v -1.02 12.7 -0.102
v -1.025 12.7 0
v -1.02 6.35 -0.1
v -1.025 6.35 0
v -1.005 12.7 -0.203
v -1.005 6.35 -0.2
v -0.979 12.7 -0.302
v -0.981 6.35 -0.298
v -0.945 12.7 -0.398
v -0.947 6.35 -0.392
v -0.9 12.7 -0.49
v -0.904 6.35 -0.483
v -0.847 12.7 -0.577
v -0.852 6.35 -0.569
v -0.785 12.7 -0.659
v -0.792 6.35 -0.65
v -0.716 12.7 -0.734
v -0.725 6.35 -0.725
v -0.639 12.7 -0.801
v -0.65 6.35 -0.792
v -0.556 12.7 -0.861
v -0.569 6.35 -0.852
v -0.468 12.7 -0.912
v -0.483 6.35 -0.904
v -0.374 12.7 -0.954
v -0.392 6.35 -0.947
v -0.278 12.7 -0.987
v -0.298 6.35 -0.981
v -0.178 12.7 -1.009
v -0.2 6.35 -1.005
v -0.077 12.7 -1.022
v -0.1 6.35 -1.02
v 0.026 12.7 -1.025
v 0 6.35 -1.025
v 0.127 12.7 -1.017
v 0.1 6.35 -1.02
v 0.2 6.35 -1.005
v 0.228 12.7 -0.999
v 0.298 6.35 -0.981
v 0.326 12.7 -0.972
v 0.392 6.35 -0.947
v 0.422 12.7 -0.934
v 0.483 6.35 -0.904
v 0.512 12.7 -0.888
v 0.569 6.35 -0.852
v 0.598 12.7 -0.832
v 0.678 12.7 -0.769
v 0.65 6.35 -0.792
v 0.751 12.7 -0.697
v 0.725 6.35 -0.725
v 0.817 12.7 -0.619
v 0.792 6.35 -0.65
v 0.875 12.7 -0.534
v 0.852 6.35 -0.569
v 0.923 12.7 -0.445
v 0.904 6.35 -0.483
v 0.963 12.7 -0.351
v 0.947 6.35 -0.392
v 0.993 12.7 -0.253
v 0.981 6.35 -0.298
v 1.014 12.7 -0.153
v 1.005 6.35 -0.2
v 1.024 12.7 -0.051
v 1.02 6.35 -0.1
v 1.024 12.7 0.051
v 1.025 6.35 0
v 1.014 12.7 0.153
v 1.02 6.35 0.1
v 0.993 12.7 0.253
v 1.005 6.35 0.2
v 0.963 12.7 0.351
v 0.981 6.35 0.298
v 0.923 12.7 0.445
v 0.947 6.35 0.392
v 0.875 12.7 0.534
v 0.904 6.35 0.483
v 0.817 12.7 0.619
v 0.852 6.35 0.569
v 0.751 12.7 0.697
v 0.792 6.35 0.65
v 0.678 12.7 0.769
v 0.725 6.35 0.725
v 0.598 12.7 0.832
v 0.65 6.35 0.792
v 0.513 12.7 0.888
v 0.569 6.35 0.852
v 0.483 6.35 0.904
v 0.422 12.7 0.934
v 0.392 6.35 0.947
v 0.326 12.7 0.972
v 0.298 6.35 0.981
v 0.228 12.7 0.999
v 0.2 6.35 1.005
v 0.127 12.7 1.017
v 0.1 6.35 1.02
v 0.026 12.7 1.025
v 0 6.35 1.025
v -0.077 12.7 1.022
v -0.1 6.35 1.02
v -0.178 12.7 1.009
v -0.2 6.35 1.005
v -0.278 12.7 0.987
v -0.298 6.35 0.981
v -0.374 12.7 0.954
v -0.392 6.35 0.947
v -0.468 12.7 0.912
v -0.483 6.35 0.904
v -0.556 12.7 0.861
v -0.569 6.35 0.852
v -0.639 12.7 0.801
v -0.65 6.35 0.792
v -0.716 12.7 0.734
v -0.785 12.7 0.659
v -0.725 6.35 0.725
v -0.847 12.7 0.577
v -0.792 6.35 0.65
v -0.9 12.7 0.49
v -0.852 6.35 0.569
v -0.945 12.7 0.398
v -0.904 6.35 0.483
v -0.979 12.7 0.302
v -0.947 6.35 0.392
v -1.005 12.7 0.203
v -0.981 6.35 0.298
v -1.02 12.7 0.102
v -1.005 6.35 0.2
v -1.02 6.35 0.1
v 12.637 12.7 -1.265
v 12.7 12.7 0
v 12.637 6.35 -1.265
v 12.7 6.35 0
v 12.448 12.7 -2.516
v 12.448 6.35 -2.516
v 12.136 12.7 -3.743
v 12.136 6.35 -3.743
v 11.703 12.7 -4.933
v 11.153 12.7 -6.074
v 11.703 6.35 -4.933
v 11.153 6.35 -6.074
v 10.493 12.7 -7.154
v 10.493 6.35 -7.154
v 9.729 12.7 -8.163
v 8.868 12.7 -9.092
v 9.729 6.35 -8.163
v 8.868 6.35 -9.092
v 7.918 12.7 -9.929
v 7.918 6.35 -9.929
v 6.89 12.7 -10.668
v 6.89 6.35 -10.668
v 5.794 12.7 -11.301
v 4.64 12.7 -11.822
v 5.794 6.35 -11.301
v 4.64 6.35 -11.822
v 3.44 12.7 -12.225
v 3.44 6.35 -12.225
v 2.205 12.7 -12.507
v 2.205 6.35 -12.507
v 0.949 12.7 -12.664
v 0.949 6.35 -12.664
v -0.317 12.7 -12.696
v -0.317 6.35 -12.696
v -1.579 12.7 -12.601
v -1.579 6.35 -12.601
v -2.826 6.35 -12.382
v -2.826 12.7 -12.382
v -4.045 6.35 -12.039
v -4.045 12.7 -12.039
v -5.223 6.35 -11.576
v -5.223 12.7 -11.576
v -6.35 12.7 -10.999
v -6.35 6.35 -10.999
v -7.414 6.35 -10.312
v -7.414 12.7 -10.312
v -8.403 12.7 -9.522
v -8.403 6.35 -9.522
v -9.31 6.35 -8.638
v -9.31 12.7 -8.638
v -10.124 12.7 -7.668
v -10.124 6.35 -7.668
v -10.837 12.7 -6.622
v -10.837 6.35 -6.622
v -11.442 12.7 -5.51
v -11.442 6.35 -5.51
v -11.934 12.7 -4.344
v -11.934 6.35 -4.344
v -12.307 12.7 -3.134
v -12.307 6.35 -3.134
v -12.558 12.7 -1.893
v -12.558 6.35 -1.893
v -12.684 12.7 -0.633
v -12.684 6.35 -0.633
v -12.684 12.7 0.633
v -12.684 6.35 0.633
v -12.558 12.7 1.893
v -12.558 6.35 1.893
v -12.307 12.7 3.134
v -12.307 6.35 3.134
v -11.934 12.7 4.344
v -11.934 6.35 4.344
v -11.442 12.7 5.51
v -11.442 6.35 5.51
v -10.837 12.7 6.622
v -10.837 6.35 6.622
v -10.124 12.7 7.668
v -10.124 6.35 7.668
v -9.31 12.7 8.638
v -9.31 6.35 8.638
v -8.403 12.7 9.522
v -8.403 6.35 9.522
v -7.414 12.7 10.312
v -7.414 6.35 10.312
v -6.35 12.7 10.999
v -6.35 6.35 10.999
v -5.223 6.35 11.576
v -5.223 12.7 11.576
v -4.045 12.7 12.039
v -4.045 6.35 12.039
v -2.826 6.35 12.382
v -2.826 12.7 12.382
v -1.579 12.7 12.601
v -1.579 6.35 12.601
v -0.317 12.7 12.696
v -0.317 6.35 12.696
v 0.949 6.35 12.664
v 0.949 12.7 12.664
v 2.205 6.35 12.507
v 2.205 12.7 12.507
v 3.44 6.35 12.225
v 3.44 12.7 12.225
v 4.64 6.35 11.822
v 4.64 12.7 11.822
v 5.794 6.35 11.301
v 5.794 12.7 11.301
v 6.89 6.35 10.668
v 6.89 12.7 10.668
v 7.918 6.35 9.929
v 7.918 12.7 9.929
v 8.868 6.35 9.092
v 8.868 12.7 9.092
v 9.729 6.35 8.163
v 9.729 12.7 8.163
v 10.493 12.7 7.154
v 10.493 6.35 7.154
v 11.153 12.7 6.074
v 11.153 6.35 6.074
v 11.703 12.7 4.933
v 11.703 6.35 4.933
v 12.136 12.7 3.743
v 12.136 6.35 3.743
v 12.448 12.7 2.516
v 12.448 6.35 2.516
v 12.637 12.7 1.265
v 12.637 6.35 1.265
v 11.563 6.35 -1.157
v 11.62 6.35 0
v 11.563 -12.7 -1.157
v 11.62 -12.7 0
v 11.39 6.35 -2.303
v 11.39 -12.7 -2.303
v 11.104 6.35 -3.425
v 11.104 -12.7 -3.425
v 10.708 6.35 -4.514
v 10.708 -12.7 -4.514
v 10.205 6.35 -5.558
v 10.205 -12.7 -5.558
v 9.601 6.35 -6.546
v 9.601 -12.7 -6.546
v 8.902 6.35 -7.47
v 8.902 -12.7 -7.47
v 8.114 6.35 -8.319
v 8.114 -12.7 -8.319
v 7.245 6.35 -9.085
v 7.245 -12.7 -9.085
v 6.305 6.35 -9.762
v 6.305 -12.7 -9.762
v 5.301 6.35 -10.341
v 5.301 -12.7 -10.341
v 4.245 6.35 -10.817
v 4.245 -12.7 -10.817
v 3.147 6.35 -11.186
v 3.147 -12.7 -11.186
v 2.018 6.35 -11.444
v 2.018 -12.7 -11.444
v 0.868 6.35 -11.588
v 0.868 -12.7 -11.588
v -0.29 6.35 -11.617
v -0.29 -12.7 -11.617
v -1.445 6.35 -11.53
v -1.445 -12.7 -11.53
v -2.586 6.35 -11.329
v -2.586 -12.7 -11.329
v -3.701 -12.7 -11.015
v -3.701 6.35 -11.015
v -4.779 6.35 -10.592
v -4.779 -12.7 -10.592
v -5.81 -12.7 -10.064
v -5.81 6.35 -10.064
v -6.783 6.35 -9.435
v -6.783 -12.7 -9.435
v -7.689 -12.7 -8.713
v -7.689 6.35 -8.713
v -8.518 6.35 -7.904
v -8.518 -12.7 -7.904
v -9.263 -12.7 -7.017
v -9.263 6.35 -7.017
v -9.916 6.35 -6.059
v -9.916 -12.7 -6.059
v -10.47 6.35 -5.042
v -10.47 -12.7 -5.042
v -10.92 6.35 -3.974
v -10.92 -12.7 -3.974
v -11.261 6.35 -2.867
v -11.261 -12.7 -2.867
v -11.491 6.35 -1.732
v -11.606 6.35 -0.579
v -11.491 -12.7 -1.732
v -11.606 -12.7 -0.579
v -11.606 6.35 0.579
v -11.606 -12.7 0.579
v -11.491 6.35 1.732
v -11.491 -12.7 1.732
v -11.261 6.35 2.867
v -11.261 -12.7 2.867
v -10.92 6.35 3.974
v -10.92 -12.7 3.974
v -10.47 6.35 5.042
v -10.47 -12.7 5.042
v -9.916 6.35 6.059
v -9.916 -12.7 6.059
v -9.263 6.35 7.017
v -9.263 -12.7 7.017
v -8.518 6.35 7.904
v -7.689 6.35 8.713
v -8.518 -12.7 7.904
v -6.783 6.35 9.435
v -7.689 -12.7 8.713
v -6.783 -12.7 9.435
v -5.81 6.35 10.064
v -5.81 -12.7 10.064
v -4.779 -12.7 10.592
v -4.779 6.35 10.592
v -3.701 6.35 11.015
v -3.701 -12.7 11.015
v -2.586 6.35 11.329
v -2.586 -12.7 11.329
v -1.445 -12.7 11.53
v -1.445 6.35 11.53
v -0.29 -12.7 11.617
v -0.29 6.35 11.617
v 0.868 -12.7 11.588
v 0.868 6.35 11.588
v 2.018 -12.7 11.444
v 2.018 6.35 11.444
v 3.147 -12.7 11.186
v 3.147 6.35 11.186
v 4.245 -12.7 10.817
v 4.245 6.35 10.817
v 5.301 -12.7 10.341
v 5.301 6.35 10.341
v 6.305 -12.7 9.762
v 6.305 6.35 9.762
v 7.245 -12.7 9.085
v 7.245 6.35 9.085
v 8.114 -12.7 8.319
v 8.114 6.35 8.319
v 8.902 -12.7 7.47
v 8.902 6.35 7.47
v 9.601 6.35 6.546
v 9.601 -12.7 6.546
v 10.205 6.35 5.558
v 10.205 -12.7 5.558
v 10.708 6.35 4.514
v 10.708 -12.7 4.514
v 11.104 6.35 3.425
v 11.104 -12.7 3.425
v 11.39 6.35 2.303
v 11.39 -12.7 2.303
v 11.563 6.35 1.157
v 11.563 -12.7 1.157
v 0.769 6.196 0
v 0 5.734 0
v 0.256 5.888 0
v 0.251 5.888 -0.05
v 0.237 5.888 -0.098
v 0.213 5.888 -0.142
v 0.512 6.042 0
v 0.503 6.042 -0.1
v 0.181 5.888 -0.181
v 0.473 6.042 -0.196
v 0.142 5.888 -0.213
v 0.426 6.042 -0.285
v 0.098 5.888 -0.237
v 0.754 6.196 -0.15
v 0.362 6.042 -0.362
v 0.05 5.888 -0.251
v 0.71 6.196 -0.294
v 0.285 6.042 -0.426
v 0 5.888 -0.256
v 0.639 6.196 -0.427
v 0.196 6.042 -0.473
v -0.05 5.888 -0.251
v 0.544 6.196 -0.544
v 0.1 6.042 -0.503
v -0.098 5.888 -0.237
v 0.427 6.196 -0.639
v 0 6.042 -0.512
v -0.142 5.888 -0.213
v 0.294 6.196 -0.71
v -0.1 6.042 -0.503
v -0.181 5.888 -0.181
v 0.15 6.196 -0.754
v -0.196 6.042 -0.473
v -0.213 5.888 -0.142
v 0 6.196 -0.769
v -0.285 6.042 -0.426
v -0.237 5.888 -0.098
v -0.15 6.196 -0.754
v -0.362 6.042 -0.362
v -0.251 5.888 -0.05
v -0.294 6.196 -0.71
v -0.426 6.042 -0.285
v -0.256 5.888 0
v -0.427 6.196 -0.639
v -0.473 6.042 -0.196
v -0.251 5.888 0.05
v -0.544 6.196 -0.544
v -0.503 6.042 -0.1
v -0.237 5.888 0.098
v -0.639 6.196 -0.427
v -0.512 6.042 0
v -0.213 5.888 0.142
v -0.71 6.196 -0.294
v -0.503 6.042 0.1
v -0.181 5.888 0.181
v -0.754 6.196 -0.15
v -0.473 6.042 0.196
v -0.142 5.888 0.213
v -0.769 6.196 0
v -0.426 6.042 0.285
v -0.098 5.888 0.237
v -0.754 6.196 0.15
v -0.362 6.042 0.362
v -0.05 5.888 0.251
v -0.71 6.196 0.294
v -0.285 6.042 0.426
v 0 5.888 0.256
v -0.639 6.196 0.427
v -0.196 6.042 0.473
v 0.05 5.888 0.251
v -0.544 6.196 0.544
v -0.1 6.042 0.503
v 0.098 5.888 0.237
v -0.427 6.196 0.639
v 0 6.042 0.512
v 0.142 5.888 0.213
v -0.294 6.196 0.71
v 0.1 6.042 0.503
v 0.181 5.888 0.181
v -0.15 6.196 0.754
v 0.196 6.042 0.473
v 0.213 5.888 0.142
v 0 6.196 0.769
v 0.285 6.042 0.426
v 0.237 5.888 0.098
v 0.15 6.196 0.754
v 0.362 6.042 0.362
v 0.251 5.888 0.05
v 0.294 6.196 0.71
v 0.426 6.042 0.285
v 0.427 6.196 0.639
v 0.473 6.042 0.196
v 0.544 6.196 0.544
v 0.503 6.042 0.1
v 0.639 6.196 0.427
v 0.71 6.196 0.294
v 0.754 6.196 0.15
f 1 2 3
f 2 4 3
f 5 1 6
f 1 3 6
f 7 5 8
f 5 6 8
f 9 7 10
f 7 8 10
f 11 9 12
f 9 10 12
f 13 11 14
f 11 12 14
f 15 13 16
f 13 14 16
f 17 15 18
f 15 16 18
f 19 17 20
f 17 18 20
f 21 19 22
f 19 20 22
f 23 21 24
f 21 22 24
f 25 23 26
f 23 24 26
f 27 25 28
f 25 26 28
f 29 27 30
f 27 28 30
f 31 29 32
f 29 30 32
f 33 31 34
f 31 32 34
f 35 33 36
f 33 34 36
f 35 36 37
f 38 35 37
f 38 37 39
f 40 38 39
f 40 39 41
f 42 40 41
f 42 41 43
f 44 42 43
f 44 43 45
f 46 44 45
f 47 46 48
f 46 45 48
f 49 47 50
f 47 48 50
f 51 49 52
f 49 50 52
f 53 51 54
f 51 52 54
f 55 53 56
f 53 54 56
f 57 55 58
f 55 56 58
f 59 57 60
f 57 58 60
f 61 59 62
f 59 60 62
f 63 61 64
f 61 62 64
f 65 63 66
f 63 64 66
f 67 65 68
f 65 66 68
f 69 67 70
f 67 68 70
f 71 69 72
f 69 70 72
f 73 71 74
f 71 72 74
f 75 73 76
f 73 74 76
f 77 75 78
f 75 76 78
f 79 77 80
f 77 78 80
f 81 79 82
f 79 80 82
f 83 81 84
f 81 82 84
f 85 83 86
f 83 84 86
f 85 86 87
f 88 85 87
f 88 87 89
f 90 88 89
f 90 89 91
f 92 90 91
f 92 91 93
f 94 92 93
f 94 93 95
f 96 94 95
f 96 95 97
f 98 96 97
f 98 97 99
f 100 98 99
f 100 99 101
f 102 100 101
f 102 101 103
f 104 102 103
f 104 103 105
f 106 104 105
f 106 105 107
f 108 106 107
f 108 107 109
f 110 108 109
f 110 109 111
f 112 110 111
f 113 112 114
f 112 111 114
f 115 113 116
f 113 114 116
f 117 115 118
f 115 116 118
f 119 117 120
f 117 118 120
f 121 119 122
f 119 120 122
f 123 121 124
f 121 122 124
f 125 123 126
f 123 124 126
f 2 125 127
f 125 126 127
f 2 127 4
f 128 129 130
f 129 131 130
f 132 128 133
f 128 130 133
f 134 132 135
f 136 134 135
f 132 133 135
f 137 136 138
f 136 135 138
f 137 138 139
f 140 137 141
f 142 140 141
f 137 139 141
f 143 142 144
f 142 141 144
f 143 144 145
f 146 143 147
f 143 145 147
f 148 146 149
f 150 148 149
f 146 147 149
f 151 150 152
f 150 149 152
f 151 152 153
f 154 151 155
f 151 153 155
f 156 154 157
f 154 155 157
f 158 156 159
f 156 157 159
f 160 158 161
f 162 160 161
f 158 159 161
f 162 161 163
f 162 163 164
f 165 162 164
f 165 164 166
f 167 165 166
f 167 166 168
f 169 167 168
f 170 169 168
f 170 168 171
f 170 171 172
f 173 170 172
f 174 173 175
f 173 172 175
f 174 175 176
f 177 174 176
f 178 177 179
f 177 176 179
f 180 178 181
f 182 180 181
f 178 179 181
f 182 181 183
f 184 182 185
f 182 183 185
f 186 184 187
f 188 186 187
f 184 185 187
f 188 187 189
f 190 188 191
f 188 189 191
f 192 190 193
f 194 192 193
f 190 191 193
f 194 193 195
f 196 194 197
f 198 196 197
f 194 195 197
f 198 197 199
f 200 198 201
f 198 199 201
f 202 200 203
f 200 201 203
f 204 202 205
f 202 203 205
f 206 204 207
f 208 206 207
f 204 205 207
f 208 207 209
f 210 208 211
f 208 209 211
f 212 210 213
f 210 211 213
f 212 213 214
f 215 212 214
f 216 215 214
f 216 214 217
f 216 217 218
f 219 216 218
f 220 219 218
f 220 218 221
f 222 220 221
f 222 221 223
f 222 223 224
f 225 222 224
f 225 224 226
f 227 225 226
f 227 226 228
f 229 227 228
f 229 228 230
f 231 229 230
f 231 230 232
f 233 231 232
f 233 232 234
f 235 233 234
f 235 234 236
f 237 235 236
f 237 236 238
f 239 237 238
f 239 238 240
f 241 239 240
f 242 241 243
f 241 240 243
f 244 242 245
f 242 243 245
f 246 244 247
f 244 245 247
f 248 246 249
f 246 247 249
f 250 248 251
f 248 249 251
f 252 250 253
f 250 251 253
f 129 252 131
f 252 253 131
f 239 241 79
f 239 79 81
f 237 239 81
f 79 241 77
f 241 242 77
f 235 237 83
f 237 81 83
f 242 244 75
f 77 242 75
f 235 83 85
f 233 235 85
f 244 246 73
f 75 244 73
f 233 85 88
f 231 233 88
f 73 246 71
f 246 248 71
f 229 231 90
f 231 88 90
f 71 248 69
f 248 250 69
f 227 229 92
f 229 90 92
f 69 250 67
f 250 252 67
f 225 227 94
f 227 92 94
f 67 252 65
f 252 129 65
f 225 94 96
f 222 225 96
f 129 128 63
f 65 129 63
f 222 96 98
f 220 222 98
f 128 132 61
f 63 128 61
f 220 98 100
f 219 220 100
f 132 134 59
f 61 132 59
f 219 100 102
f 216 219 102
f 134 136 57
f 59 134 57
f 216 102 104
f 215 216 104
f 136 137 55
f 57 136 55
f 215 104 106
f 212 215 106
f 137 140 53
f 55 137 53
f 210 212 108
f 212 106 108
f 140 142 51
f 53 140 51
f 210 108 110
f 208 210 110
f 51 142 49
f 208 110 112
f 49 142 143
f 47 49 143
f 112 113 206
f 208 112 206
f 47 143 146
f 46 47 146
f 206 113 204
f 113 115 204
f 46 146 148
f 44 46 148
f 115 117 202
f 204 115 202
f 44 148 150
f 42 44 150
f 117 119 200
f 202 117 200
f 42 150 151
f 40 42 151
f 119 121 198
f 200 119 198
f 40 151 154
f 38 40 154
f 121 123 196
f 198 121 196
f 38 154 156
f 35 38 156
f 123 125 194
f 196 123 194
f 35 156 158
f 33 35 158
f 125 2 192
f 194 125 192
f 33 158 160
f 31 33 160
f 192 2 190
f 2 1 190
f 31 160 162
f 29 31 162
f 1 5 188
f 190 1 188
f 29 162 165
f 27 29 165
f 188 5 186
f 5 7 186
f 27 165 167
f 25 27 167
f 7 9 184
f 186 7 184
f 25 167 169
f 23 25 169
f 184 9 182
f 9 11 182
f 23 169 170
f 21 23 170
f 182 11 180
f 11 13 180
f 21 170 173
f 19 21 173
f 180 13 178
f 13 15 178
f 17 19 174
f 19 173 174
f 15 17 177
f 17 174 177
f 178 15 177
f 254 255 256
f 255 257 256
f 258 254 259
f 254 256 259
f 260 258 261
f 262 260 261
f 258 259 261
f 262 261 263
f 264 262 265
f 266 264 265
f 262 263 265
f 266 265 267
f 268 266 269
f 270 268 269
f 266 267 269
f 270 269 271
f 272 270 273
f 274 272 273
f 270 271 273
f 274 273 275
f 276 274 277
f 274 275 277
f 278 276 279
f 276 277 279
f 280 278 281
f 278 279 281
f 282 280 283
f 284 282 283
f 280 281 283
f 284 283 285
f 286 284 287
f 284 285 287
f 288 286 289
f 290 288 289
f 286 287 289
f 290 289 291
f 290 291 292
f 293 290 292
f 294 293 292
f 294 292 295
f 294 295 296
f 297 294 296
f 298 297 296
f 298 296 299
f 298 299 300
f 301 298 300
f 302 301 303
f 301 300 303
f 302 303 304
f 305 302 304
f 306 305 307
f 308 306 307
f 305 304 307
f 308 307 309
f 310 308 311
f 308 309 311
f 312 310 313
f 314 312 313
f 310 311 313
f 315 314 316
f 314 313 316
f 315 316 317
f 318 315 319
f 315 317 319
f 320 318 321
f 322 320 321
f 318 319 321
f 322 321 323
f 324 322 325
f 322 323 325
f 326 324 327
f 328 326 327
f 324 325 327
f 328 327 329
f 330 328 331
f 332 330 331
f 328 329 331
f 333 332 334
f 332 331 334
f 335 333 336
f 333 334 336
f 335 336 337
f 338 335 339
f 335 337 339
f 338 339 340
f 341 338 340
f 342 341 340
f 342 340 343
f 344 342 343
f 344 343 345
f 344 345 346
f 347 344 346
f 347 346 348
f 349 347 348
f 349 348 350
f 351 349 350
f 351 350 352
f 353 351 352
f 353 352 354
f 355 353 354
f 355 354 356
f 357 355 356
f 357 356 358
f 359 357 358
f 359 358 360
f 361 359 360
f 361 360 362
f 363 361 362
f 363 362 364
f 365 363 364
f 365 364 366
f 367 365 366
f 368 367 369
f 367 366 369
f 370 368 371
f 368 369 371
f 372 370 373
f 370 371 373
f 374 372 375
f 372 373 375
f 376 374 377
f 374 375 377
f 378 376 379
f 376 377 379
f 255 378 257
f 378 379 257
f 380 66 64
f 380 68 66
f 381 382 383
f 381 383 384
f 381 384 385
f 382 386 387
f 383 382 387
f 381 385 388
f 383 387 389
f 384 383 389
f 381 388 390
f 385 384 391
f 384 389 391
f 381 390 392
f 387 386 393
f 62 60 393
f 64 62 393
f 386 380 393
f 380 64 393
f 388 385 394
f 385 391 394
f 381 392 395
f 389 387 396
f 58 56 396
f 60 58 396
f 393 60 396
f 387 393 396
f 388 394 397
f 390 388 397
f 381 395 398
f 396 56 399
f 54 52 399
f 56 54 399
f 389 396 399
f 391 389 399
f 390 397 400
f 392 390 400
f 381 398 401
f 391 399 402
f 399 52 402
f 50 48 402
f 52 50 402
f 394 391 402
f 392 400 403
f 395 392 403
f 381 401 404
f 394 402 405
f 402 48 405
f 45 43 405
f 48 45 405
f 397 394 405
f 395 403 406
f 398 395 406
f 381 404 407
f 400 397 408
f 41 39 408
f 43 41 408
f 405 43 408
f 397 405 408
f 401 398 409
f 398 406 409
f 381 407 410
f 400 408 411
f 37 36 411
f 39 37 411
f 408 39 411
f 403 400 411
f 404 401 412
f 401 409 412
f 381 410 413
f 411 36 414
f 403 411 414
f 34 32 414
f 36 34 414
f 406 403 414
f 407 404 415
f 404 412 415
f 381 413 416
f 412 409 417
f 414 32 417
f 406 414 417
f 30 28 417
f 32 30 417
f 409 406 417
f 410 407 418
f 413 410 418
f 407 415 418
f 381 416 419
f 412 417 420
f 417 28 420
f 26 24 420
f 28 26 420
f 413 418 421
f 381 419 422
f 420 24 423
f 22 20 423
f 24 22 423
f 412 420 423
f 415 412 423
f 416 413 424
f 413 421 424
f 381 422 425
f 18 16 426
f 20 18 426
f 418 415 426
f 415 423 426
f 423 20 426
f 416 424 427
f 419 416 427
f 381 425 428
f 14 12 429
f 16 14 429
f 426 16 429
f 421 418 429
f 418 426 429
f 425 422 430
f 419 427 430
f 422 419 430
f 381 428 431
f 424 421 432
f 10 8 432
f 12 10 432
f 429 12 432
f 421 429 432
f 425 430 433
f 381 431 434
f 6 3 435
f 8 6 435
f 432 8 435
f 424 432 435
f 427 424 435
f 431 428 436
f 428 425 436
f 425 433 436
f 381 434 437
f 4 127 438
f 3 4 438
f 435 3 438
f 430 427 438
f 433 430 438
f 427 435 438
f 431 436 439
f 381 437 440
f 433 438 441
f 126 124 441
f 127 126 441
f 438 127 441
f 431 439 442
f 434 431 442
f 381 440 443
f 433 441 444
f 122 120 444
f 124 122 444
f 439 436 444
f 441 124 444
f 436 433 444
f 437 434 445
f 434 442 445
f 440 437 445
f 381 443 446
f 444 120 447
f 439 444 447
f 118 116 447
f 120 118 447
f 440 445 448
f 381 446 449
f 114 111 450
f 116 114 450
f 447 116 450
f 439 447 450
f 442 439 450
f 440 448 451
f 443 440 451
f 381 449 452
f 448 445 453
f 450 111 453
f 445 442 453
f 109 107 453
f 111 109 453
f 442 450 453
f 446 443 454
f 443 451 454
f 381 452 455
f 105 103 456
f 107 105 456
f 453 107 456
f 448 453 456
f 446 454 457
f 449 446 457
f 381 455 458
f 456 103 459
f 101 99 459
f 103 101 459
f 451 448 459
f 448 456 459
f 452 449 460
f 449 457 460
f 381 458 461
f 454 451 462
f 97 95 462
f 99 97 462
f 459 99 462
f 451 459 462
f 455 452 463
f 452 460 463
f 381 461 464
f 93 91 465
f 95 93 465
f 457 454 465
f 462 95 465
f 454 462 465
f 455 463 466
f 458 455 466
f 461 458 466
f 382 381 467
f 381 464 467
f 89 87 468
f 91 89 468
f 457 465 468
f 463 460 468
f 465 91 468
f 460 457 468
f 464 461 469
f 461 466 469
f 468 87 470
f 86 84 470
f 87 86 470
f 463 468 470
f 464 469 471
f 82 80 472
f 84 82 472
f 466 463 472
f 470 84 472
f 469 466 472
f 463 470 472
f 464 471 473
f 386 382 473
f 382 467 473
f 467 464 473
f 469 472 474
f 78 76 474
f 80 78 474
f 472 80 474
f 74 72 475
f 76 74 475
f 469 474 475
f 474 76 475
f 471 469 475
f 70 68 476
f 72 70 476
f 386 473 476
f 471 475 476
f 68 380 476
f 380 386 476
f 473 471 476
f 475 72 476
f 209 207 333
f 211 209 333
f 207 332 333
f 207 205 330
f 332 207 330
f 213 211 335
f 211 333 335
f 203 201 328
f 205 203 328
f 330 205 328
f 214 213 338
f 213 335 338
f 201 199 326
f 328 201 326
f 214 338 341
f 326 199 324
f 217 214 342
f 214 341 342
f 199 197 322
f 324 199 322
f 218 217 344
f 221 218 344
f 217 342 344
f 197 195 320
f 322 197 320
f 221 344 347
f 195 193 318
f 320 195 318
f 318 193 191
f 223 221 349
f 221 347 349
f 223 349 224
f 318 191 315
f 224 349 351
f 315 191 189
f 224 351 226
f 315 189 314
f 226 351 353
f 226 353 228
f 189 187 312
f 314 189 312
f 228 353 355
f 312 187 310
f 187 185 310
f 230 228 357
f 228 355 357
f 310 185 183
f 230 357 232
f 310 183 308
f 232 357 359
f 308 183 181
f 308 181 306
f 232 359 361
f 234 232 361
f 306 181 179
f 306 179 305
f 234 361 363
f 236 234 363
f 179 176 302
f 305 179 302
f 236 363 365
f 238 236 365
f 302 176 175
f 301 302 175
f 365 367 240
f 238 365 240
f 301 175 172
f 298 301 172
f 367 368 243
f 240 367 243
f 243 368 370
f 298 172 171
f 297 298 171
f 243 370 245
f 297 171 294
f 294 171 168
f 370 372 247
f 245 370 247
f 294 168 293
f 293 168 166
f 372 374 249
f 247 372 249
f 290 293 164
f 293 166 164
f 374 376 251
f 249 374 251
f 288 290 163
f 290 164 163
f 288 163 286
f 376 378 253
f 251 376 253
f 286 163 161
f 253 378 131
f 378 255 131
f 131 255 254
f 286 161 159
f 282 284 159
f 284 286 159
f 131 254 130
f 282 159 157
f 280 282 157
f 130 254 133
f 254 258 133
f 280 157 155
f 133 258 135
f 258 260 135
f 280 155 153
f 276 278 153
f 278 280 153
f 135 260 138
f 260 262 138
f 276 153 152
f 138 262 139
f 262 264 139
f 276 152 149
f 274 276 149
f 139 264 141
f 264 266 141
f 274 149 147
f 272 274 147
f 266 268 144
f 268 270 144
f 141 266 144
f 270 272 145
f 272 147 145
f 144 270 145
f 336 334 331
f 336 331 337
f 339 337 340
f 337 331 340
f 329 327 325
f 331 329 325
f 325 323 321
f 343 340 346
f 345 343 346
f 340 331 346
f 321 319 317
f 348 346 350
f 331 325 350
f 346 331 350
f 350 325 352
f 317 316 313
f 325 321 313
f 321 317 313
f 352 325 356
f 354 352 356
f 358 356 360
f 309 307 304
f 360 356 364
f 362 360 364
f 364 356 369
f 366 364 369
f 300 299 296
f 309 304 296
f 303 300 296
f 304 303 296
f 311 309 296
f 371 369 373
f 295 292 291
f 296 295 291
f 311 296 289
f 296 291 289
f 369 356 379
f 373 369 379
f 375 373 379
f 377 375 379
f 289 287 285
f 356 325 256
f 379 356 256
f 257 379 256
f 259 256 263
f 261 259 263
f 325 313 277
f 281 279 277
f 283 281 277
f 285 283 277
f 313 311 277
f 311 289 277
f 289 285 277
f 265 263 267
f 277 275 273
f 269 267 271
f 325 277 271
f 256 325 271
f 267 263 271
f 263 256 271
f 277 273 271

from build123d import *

# Parameters (mm, degrees)
M2_5X0_45_TAPPED_HOLE1_D     = 2.05
M2_5X0_45_TAPPED_HOLE1_DEPTH = 6.35
M2_5X0_45_TAPPED_HOLE1_TIP   = 0.615882135


with BuildPart() as part:
    # Sketch1 → Revolve1 (revolve)
    with BuildSketch(Plane.XY, mode=Mode.PRIVATE) as revolve1_sk:
        Polygon((0, 12.7), (-12.7, 12.7), (-12.7, 6.35), (-11.6205, 6.35), (-11.6205, -12.7), (0, -12.7), align=None)
    revolve(revolve1_sk.sketch.rotate(Axis((0, -12.7, 0), (0, 1, 0)), 180), axis=Axis((0, -12.7, 0), (0, 1, 0)))

    # M2.5x0.45 Tapped Hole1
    with Locations(Plane(origin=(0, 12.7, 0), x_dir=(1, 0, 0), z_dir=(0, 1, 0))):
        with Locations((0, 0)):
            Hole(M2_5X0_45_TAPPED_HOLE1_D / 2, depth=M2_5X0_45_TAPPED_HOLE1_DEPTH)
            with Locations((0, 0, -(M2_5X0_45_TAPPED_HOLE1_DEPTH + M2_5X0_45_TAPPED_HOLE1_TIP / 2))):  # 118° drill point
                Cone(0, M2_5X0_45_TAPPED_HOLE1_D / 2, M2_5X0_45_TAPPED_HOLE1_TIP, mode=Mode.SUBTRACT)


solid = part.part
